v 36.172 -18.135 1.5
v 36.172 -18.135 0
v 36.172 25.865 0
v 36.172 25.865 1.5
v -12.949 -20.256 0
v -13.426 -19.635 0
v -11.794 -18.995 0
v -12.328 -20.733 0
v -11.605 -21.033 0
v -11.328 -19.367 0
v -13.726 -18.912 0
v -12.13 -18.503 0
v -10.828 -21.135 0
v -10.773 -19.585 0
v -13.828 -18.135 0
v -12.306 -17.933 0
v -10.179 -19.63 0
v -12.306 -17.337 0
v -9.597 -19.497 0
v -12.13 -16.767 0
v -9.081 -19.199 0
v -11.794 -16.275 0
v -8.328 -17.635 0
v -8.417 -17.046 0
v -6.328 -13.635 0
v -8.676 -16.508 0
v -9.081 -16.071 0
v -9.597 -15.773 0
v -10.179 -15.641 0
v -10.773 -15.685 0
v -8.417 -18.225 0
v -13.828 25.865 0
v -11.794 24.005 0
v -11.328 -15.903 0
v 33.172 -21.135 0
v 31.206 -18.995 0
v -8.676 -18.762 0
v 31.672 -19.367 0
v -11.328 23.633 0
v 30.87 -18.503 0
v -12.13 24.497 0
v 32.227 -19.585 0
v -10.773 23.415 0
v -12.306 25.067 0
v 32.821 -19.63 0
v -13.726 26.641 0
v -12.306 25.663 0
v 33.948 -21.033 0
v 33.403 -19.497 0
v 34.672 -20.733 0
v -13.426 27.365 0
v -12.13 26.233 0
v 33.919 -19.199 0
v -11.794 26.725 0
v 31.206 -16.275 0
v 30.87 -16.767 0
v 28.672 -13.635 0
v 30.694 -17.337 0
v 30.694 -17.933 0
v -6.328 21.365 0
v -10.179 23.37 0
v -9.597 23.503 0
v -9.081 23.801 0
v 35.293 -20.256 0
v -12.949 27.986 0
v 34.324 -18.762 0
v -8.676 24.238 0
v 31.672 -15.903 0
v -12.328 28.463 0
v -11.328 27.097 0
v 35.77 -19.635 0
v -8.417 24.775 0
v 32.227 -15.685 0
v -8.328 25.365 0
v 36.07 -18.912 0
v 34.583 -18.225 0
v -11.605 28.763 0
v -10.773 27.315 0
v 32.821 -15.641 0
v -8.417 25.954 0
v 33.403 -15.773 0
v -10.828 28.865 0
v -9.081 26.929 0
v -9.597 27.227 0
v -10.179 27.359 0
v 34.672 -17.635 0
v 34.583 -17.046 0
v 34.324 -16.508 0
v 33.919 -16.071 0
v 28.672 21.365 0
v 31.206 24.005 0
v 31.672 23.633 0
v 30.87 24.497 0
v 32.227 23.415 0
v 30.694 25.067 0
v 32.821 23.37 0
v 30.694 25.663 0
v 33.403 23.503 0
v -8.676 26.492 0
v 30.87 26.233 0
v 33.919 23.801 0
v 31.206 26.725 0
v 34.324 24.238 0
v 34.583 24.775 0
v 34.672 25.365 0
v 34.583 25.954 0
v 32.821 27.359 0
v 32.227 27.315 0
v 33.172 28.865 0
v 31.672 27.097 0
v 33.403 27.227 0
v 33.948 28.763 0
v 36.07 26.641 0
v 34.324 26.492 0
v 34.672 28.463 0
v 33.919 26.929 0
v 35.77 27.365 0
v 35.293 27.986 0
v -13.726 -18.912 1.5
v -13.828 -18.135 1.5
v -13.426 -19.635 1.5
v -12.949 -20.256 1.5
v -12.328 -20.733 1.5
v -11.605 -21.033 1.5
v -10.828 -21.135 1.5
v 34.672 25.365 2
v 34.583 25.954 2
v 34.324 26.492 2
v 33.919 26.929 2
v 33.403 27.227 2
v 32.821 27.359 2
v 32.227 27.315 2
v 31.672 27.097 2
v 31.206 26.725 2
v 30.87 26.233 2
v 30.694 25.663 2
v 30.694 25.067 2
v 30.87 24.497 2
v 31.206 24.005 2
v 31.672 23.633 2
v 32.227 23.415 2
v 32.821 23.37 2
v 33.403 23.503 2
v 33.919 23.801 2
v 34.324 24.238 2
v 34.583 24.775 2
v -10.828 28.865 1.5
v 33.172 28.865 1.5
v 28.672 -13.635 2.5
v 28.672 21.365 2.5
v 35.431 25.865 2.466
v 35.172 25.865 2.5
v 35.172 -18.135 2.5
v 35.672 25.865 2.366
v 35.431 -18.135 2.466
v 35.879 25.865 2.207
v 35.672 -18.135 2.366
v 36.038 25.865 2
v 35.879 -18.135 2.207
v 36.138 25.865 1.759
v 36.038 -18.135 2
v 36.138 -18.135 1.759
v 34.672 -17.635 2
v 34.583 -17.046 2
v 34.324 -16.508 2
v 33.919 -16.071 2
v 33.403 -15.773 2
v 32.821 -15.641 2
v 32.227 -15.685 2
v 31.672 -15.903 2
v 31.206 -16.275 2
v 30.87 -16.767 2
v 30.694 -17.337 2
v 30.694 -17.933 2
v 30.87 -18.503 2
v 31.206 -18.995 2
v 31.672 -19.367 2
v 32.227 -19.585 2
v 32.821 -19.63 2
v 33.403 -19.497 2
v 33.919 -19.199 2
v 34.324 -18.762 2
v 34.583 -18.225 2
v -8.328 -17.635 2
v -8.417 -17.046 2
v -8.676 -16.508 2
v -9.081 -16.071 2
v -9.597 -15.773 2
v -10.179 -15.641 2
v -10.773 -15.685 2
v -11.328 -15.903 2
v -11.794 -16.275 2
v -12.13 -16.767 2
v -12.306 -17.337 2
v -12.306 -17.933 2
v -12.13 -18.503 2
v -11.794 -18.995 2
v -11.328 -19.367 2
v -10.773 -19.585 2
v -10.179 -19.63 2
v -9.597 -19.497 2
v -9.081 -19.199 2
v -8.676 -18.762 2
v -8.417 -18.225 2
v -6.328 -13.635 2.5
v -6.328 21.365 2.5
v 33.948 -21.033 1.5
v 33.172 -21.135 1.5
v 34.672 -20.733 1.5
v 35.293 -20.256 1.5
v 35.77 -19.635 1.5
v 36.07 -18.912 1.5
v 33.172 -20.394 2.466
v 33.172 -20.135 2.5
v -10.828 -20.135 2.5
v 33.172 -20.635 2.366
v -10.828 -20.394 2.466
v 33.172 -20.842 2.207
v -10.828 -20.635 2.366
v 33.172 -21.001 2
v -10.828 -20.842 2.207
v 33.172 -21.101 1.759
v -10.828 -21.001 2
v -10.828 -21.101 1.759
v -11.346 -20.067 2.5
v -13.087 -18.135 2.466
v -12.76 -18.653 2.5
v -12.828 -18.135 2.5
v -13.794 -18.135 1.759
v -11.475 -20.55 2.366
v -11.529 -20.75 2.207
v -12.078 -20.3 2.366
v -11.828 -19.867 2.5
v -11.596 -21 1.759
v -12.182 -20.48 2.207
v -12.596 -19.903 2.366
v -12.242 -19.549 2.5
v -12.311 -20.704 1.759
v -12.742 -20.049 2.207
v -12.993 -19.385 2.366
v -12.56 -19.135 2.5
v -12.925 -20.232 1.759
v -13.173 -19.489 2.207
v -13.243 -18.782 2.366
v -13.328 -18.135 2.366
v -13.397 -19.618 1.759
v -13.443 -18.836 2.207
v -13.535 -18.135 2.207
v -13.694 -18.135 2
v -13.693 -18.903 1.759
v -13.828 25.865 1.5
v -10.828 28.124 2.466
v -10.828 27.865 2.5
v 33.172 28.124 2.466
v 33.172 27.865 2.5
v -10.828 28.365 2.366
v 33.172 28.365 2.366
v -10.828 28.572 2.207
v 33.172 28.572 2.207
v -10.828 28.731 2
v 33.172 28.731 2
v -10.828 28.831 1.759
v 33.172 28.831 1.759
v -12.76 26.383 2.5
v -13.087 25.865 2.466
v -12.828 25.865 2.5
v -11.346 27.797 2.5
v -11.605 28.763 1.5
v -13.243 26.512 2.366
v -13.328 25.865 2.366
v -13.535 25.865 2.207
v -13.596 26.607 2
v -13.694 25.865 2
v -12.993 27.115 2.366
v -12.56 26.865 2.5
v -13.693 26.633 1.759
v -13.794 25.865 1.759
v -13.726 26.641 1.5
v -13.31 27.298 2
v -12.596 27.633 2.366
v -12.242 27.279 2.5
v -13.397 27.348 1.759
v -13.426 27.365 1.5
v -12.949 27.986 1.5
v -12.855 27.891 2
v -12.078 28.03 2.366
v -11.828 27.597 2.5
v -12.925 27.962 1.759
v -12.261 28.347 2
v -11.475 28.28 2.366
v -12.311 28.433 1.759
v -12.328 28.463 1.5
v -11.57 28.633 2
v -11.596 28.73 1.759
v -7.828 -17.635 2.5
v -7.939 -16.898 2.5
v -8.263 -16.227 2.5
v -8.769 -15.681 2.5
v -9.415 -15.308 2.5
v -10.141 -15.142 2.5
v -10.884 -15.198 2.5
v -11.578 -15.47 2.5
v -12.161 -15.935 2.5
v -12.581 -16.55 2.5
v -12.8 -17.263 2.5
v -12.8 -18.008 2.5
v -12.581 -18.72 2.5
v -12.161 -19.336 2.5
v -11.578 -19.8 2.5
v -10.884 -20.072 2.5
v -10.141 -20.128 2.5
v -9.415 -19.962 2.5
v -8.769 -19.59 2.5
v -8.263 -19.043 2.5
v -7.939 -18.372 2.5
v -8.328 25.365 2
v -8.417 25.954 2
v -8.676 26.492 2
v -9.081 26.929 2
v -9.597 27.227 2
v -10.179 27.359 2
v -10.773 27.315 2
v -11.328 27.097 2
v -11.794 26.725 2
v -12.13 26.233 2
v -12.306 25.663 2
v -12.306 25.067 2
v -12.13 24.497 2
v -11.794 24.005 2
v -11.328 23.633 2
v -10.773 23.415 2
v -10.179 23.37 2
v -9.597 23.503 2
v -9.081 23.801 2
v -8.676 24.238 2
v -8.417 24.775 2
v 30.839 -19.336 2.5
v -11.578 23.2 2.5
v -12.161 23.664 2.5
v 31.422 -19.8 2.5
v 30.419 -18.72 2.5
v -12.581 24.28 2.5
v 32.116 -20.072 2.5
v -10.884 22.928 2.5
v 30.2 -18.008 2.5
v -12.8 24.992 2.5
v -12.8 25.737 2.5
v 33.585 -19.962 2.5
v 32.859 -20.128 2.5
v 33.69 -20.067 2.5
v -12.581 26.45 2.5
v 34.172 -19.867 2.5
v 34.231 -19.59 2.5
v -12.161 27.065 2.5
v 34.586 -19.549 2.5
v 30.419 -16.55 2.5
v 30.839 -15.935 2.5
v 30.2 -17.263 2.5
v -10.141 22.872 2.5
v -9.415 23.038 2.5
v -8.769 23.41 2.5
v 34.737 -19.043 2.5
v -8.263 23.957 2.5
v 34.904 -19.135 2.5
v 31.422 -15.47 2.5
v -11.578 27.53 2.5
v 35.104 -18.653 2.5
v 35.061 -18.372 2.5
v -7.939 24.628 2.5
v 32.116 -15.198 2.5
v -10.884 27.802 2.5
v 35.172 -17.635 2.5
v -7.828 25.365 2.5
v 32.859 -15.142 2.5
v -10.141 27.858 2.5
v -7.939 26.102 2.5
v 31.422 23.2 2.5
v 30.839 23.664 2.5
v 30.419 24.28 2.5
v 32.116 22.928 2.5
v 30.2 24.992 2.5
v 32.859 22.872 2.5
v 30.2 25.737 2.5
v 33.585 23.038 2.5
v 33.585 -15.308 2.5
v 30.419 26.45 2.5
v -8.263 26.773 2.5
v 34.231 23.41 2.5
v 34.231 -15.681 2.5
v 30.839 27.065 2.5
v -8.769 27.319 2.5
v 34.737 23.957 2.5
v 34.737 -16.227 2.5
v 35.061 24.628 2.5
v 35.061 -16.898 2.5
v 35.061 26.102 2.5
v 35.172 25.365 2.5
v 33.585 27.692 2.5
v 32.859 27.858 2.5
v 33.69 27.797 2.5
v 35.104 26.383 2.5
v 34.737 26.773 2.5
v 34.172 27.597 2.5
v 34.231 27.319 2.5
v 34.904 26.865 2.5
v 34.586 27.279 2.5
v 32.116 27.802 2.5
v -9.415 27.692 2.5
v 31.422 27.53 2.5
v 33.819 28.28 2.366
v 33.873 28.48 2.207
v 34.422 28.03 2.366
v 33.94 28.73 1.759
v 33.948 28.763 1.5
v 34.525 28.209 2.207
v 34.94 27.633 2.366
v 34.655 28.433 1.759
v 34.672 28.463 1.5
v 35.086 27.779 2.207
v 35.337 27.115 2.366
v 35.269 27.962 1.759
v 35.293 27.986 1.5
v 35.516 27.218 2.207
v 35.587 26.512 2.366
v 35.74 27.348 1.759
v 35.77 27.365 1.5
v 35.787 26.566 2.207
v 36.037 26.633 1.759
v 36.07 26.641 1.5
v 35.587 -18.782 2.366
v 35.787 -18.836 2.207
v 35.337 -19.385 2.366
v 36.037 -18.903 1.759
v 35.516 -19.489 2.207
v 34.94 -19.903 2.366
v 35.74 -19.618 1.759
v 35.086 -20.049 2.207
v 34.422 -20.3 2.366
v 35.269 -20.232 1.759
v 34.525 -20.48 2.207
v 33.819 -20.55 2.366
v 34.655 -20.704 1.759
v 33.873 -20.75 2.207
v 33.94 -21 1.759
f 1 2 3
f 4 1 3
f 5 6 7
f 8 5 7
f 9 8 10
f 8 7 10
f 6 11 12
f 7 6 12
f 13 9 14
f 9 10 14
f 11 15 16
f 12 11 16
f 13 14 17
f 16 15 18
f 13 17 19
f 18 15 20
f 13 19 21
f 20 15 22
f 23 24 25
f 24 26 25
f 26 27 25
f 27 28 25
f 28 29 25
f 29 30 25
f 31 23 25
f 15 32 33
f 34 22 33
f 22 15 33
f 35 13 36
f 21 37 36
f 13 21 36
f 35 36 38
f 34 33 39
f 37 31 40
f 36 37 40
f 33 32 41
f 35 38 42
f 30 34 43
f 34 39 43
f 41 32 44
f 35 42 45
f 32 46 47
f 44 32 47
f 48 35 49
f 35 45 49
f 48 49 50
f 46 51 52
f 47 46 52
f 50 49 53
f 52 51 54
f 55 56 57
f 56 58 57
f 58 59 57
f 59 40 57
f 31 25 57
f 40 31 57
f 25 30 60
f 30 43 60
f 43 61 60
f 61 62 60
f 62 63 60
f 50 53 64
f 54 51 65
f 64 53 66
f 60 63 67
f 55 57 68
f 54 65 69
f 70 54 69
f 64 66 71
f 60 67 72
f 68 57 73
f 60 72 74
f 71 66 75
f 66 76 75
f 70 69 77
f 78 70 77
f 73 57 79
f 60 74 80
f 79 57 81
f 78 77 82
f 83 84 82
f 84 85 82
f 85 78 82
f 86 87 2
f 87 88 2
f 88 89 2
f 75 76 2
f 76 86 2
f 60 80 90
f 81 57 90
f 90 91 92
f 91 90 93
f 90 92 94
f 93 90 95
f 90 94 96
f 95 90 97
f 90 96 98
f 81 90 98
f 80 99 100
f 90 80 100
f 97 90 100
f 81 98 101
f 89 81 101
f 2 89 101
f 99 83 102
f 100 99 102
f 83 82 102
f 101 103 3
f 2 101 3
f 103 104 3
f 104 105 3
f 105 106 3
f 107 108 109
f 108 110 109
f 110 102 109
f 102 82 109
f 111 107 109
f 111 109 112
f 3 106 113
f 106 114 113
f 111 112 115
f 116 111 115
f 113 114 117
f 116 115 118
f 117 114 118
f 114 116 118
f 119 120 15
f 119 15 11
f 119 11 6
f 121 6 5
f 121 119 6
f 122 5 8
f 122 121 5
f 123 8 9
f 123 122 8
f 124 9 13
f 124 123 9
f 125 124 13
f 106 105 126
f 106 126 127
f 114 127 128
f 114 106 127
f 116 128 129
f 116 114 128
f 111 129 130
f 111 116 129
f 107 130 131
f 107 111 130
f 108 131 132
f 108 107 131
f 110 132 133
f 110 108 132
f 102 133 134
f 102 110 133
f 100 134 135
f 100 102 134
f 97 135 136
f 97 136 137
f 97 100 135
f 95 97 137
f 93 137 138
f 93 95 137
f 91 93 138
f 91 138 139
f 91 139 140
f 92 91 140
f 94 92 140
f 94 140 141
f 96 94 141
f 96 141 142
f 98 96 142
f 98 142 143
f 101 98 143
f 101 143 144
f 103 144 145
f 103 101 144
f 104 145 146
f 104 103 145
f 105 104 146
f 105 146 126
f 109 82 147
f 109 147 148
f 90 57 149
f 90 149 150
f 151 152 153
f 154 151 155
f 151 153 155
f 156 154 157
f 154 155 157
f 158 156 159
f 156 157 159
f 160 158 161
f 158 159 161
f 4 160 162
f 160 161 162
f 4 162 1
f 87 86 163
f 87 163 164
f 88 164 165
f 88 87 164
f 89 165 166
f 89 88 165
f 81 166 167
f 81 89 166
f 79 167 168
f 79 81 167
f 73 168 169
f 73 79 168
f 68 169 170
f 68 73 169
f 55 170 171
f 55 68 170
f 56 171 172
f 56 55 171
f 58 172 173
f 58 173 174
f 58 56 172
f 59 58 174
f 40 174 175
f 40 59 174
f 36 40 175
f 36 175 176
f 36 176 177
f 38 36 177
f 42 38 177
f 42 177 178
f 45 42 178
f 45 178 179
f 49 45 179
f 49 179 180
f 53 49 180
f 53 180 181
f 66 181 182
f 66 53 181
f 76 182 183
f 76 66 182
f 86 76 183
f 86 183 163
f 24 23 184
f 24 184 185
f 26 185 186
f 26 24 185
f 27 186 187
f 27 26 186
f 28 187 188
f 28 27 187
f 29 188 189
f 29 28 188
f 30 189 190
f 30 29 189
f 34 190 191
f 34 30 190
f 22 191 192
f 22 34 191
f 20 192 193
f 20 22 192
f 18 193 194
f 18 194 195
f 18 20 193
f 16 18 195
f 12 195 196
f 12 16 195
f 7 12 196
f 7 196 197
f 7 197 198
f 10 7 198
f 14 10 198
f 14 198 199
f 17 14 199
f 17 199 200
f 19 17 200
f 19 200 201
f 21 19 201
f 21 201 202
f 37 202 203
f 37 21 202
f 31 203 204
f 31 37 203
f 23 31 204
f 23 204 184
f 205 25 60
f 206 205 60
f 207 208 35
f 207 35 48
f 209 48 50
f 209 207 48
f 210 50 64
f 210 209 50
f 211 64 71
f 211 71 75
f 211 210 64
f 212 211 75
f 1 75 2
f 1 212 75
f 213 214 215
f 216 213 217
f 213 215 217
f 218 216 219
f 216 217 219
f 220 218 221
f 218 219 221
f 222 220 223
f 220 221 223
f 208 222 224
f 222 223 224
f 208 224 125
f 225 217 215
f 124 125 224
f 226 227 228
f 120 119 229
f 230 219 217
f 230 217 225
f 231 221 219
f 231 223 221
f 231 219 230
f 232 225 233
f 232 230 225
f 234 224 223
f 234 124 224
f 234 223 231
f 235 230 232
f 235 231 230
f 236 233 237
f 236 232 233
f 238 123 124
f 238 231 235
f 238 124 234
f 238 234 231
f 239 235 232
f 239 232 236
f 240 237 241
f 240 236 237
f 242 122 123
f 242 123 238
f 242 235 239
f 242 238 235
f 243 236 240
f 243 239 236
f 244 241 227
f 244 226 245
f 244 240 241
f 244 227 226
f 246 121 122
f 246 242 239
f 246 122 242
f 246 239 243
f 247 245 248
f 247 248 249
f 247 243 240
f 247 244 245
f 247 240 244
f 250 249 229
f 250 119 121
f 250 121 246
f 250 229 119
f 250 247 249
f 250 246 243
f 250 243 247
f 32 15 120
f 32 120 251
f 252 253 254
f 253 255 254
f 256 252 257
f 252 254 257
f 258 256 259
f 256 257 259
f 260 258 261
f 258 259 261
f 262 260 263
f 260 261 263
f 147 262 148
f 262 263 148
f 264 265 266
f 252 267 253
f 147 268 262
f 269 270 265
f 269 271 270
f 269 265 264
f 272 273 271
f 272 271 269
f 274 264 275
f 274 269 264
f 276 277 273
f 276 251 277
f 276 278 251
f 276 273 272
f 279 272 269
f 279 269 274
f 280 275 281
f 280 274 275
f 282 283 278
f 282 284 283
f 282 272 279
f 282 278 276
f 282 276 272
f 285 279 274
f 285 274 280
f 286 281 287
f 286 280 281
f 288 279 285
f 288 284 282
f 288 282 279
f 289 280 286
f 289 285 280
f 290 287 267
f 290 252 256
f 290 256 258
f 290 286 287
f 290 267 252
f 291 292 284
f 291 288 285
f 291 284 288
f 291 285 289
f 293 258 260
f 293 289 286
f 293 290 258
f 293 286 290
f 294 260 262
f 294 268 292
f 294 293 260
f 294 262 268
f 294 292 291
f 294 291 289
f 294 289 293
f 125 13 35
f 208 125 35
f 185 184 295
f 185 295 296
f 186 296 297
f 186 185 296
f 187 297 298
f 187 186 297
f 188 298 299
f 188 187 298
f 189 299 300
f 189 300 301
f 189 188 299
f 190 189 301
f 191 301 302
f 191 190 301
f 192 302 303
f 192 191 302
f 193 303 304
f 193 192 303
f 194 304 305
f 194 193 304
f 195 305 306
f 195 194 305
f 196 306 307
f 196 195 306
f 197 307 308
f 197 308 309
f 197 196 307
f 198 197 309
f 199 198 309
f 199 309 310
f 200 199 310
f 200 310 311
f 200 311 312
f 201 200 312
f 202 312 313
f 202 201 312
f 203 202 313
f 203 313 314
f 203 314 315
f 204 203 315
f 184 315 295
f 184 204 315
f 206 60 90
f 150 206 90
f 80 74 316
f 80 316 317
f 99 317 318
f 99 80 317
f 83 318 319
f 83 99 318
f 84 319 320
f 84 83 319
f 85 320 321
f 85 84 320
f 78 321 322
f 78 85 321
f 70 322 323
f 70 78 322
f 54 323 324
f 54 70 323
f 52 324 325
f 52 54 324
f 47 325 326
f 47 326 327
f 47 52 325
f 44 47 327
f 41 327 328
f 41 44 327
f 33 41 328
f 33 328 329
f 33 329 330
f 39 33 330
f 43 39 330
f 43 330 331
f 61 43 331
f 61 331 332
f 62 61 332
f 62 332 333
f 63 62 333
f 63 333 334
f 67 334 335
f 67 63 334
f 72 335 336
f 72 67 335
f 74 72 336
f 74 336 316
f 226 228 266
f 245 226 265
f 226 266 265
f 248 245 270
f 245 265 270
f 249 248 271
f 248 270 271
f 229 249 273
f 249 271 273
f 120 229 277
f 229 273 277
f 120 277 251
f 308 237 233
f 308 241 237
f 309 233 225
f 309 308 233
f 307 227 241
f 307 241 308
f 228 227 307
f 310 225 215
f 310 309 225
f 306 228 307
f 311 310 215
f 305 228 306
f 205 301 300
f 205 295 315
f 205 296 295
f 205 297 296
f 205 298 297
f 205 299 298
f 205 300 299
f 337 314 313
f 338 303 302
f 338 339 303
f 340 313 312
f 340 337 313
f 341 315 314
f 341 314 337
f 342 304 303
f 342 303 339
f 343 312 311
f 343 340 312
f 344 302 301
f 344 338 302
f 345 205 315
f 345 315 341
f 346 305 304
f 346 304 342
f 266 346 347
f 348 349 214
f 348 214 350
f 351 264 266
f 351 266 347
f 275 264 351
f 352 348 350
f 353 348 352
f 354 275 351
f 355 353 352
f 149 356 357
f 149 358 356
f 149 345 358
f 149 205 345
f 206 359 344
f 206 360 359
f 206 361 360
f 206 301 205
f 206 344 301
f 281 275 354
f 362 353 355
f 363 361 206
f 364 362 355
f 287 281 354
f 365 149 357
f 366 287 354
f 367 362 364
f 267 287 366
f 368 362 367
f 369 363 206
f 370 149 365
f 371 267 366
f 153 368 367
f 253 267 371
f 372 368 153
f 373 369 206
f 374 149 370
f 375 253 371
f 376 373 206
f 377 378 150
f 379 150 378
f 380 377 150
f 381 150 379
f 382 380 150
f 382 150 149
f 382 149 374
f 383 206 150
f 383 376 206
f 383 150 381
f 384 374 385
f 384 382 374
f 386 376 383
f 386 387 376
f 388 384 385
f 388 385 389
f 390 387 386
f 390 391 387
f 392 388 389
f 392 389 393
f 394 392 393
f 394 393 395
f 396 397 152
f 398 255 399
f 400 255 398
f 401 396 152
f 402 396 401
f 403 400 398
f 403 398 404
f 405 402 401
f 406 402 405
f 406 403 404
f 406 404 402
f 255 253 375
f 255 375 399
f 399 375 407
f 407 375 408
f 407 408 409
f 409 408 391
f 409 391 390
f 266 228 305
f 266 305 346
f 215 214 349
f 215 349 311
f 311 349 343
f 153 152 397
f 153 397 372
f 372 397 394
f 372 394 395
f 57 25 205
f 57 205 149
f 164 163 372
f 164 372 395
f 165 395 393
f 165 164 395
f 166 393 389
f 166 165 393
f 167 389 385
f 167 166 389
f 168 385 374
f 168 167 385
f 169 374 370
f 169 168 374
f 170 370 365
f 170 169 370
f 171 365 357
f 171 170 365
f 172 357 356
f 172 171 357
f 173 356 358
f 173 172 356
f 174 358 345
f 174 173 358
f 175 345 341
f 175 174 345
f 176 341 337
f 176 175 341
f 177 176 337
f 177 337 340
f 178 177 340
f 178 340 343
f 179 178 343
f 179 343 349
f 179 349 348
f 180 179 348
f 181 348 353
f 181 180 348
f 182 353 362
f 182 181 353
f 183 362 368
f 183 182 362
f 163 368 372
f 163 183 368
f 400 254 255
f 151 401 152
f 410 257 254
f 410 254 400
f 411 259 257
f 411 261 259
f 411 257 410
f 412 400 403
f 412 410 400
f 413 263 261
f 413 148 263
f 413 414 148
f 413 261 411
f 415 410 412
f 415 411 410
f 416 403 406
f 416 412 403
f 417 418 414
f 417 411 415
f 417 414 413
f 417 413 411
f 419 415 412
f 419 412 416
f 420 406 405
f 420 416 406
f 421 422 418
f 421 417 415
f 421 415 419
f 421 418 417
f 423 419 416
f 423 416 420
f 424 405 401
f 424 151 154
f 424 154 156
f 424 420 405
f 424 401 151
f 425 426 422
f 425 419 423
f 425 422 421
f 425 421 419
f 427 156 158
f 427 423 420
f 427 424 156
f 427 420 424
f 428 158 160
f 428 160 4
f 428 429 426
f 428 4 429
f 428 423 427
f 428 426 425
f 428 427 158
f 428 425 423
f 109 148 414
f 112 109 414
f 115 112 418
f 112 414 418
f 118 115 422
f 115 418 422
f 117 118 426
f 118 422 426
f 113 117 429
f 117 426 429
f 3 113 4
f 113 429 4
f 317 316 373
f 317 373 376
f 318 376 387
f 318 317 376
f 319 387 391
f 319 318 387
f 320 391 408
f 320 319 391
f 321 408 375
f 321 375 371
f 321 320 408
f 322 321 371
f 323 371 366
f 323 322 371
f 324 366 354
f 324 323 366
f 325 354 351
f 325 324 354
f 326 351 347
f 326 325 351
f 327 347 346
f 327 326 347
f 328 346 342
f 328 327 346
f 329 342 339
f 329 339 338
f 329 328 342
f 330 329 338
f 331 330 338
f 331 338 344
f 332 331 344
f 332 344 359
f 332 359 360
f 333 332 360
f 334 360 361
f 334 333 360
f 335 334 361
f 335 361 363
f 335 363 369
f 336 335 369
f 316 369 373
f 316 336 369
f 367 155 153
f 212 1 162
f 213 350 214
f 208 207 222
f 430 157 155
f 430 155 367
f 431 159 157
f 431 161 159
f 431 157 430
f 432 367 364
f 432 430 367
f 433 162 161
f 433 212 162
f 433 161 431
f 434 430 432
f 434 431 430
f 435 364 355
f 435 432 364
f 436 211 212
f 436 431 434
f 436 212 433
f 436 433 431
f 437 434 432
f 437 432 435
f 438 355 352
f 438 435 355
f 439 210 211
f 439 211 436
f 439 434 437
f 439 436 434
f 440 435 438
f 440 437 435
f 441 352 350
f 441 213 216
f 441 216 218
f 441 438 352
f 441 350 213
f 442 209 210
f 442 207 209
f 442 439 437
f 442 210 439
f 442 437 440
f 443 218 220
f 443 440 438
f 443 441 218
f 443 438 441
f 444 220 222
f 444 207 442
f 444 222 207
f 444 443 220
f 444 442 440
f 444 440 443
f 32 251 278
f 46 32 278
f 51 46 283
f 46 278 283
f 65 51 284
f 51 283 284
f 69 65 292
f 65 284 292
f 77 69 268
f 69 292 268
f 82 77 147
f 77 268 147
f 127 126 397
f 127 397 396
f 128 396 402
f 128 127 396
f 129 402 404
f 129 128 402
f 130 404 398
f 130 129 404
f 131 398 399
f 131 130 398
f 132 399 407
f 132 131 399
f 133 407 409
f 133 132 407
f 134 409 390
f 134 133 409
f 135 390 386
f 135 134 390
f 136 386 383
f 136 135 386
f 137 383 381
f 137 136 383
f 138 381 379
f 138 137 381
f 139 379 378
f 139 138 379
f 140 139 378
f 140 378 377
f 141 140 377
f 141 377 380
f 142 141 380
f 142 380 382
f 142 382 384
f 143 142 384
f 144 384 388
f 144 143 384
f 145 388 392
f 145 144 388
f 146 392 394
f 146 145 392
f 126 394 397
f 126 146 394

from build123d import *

# Parameters (mm, degrees)
F0_W     = 50
F0_H     = 50
F0_R     = 2
F0_W_2   = 35
F0_H_2   = 35
F1_DEPTH = 2.5
F2_R     = 3
F3_SIZE  = 0.5
F4_R     = 0.99999


# Not quite as in the source:
# - a fillet or chamfer is up to 0.001 mm smaller than in the source, because OpenCascade refuses the exact size


with BuildPart() as f1:
    # F0 (on Top) → F1 (new body)
    with BuildSketch(Plane.XY):
        with Locations((11.1718769372, 3.8648895919)):
            Rectangle(F0_W, F0_H)
        with Locations((-10.3281230628, -17.6351104081)):
            Circle(F0_R, mode=Mode.SUBTRACT)
        with Locations((32.6718769372, -17.6351104081)):
            Circle(F0_R, mode=Mode.SUBTRACT)
        with Locations((11.1718769372, 3.8648895919)):
            Rectangle(F0_W_2, F0_H_2, mode=Mode.SUBTRACT)
        with Locations((-10.3281230628, 25.3648895919)):
            Circle(F0_R, mode=Mode.SUBTRACT)
        with Locations((32.6718769372, 25.3648895919)):
            Circle(F0_R, mode=Mode.SUBTRACT)
    extrude(amount=F1_DEPTH)

    # F2
    f2_edges = [f1.edges().sort_by_distance(p)[0] for p in [
        (-13.828123, 28.86489, 1.25),
        (36.171877, 28.86489, 1.25),
        (36.171877, -21.13511, 1.25),
        (-13.828123, -21.13511, 1.25),
    ]]
    fillet(f2_edges, radius=F2_R)

    # F3
    f3_edges = [f1.edges().sort_by_distance(p)[0] for p in [
        (-12.328123, 25.36489, 2.5),
        (30.671877, 25.36489, 2.5),
        (30.671877, -17.63511, 2.5),
        (-12.328123, -17.63511, 2.5),
    ]]
    chamfer(f3_edges, length=F3_SIZE)

    # F4 (radius 1 in the source; OpenCascade refuses exactly that, so slightly less here)
    f4_edges = [f1.edges().sort_by_distance(p)[0] for p in [
        (11.171877, 28.86489, 2.5),
    ]]
    fillet(f4_edges, radius=F4_R)


solid = f1.part
